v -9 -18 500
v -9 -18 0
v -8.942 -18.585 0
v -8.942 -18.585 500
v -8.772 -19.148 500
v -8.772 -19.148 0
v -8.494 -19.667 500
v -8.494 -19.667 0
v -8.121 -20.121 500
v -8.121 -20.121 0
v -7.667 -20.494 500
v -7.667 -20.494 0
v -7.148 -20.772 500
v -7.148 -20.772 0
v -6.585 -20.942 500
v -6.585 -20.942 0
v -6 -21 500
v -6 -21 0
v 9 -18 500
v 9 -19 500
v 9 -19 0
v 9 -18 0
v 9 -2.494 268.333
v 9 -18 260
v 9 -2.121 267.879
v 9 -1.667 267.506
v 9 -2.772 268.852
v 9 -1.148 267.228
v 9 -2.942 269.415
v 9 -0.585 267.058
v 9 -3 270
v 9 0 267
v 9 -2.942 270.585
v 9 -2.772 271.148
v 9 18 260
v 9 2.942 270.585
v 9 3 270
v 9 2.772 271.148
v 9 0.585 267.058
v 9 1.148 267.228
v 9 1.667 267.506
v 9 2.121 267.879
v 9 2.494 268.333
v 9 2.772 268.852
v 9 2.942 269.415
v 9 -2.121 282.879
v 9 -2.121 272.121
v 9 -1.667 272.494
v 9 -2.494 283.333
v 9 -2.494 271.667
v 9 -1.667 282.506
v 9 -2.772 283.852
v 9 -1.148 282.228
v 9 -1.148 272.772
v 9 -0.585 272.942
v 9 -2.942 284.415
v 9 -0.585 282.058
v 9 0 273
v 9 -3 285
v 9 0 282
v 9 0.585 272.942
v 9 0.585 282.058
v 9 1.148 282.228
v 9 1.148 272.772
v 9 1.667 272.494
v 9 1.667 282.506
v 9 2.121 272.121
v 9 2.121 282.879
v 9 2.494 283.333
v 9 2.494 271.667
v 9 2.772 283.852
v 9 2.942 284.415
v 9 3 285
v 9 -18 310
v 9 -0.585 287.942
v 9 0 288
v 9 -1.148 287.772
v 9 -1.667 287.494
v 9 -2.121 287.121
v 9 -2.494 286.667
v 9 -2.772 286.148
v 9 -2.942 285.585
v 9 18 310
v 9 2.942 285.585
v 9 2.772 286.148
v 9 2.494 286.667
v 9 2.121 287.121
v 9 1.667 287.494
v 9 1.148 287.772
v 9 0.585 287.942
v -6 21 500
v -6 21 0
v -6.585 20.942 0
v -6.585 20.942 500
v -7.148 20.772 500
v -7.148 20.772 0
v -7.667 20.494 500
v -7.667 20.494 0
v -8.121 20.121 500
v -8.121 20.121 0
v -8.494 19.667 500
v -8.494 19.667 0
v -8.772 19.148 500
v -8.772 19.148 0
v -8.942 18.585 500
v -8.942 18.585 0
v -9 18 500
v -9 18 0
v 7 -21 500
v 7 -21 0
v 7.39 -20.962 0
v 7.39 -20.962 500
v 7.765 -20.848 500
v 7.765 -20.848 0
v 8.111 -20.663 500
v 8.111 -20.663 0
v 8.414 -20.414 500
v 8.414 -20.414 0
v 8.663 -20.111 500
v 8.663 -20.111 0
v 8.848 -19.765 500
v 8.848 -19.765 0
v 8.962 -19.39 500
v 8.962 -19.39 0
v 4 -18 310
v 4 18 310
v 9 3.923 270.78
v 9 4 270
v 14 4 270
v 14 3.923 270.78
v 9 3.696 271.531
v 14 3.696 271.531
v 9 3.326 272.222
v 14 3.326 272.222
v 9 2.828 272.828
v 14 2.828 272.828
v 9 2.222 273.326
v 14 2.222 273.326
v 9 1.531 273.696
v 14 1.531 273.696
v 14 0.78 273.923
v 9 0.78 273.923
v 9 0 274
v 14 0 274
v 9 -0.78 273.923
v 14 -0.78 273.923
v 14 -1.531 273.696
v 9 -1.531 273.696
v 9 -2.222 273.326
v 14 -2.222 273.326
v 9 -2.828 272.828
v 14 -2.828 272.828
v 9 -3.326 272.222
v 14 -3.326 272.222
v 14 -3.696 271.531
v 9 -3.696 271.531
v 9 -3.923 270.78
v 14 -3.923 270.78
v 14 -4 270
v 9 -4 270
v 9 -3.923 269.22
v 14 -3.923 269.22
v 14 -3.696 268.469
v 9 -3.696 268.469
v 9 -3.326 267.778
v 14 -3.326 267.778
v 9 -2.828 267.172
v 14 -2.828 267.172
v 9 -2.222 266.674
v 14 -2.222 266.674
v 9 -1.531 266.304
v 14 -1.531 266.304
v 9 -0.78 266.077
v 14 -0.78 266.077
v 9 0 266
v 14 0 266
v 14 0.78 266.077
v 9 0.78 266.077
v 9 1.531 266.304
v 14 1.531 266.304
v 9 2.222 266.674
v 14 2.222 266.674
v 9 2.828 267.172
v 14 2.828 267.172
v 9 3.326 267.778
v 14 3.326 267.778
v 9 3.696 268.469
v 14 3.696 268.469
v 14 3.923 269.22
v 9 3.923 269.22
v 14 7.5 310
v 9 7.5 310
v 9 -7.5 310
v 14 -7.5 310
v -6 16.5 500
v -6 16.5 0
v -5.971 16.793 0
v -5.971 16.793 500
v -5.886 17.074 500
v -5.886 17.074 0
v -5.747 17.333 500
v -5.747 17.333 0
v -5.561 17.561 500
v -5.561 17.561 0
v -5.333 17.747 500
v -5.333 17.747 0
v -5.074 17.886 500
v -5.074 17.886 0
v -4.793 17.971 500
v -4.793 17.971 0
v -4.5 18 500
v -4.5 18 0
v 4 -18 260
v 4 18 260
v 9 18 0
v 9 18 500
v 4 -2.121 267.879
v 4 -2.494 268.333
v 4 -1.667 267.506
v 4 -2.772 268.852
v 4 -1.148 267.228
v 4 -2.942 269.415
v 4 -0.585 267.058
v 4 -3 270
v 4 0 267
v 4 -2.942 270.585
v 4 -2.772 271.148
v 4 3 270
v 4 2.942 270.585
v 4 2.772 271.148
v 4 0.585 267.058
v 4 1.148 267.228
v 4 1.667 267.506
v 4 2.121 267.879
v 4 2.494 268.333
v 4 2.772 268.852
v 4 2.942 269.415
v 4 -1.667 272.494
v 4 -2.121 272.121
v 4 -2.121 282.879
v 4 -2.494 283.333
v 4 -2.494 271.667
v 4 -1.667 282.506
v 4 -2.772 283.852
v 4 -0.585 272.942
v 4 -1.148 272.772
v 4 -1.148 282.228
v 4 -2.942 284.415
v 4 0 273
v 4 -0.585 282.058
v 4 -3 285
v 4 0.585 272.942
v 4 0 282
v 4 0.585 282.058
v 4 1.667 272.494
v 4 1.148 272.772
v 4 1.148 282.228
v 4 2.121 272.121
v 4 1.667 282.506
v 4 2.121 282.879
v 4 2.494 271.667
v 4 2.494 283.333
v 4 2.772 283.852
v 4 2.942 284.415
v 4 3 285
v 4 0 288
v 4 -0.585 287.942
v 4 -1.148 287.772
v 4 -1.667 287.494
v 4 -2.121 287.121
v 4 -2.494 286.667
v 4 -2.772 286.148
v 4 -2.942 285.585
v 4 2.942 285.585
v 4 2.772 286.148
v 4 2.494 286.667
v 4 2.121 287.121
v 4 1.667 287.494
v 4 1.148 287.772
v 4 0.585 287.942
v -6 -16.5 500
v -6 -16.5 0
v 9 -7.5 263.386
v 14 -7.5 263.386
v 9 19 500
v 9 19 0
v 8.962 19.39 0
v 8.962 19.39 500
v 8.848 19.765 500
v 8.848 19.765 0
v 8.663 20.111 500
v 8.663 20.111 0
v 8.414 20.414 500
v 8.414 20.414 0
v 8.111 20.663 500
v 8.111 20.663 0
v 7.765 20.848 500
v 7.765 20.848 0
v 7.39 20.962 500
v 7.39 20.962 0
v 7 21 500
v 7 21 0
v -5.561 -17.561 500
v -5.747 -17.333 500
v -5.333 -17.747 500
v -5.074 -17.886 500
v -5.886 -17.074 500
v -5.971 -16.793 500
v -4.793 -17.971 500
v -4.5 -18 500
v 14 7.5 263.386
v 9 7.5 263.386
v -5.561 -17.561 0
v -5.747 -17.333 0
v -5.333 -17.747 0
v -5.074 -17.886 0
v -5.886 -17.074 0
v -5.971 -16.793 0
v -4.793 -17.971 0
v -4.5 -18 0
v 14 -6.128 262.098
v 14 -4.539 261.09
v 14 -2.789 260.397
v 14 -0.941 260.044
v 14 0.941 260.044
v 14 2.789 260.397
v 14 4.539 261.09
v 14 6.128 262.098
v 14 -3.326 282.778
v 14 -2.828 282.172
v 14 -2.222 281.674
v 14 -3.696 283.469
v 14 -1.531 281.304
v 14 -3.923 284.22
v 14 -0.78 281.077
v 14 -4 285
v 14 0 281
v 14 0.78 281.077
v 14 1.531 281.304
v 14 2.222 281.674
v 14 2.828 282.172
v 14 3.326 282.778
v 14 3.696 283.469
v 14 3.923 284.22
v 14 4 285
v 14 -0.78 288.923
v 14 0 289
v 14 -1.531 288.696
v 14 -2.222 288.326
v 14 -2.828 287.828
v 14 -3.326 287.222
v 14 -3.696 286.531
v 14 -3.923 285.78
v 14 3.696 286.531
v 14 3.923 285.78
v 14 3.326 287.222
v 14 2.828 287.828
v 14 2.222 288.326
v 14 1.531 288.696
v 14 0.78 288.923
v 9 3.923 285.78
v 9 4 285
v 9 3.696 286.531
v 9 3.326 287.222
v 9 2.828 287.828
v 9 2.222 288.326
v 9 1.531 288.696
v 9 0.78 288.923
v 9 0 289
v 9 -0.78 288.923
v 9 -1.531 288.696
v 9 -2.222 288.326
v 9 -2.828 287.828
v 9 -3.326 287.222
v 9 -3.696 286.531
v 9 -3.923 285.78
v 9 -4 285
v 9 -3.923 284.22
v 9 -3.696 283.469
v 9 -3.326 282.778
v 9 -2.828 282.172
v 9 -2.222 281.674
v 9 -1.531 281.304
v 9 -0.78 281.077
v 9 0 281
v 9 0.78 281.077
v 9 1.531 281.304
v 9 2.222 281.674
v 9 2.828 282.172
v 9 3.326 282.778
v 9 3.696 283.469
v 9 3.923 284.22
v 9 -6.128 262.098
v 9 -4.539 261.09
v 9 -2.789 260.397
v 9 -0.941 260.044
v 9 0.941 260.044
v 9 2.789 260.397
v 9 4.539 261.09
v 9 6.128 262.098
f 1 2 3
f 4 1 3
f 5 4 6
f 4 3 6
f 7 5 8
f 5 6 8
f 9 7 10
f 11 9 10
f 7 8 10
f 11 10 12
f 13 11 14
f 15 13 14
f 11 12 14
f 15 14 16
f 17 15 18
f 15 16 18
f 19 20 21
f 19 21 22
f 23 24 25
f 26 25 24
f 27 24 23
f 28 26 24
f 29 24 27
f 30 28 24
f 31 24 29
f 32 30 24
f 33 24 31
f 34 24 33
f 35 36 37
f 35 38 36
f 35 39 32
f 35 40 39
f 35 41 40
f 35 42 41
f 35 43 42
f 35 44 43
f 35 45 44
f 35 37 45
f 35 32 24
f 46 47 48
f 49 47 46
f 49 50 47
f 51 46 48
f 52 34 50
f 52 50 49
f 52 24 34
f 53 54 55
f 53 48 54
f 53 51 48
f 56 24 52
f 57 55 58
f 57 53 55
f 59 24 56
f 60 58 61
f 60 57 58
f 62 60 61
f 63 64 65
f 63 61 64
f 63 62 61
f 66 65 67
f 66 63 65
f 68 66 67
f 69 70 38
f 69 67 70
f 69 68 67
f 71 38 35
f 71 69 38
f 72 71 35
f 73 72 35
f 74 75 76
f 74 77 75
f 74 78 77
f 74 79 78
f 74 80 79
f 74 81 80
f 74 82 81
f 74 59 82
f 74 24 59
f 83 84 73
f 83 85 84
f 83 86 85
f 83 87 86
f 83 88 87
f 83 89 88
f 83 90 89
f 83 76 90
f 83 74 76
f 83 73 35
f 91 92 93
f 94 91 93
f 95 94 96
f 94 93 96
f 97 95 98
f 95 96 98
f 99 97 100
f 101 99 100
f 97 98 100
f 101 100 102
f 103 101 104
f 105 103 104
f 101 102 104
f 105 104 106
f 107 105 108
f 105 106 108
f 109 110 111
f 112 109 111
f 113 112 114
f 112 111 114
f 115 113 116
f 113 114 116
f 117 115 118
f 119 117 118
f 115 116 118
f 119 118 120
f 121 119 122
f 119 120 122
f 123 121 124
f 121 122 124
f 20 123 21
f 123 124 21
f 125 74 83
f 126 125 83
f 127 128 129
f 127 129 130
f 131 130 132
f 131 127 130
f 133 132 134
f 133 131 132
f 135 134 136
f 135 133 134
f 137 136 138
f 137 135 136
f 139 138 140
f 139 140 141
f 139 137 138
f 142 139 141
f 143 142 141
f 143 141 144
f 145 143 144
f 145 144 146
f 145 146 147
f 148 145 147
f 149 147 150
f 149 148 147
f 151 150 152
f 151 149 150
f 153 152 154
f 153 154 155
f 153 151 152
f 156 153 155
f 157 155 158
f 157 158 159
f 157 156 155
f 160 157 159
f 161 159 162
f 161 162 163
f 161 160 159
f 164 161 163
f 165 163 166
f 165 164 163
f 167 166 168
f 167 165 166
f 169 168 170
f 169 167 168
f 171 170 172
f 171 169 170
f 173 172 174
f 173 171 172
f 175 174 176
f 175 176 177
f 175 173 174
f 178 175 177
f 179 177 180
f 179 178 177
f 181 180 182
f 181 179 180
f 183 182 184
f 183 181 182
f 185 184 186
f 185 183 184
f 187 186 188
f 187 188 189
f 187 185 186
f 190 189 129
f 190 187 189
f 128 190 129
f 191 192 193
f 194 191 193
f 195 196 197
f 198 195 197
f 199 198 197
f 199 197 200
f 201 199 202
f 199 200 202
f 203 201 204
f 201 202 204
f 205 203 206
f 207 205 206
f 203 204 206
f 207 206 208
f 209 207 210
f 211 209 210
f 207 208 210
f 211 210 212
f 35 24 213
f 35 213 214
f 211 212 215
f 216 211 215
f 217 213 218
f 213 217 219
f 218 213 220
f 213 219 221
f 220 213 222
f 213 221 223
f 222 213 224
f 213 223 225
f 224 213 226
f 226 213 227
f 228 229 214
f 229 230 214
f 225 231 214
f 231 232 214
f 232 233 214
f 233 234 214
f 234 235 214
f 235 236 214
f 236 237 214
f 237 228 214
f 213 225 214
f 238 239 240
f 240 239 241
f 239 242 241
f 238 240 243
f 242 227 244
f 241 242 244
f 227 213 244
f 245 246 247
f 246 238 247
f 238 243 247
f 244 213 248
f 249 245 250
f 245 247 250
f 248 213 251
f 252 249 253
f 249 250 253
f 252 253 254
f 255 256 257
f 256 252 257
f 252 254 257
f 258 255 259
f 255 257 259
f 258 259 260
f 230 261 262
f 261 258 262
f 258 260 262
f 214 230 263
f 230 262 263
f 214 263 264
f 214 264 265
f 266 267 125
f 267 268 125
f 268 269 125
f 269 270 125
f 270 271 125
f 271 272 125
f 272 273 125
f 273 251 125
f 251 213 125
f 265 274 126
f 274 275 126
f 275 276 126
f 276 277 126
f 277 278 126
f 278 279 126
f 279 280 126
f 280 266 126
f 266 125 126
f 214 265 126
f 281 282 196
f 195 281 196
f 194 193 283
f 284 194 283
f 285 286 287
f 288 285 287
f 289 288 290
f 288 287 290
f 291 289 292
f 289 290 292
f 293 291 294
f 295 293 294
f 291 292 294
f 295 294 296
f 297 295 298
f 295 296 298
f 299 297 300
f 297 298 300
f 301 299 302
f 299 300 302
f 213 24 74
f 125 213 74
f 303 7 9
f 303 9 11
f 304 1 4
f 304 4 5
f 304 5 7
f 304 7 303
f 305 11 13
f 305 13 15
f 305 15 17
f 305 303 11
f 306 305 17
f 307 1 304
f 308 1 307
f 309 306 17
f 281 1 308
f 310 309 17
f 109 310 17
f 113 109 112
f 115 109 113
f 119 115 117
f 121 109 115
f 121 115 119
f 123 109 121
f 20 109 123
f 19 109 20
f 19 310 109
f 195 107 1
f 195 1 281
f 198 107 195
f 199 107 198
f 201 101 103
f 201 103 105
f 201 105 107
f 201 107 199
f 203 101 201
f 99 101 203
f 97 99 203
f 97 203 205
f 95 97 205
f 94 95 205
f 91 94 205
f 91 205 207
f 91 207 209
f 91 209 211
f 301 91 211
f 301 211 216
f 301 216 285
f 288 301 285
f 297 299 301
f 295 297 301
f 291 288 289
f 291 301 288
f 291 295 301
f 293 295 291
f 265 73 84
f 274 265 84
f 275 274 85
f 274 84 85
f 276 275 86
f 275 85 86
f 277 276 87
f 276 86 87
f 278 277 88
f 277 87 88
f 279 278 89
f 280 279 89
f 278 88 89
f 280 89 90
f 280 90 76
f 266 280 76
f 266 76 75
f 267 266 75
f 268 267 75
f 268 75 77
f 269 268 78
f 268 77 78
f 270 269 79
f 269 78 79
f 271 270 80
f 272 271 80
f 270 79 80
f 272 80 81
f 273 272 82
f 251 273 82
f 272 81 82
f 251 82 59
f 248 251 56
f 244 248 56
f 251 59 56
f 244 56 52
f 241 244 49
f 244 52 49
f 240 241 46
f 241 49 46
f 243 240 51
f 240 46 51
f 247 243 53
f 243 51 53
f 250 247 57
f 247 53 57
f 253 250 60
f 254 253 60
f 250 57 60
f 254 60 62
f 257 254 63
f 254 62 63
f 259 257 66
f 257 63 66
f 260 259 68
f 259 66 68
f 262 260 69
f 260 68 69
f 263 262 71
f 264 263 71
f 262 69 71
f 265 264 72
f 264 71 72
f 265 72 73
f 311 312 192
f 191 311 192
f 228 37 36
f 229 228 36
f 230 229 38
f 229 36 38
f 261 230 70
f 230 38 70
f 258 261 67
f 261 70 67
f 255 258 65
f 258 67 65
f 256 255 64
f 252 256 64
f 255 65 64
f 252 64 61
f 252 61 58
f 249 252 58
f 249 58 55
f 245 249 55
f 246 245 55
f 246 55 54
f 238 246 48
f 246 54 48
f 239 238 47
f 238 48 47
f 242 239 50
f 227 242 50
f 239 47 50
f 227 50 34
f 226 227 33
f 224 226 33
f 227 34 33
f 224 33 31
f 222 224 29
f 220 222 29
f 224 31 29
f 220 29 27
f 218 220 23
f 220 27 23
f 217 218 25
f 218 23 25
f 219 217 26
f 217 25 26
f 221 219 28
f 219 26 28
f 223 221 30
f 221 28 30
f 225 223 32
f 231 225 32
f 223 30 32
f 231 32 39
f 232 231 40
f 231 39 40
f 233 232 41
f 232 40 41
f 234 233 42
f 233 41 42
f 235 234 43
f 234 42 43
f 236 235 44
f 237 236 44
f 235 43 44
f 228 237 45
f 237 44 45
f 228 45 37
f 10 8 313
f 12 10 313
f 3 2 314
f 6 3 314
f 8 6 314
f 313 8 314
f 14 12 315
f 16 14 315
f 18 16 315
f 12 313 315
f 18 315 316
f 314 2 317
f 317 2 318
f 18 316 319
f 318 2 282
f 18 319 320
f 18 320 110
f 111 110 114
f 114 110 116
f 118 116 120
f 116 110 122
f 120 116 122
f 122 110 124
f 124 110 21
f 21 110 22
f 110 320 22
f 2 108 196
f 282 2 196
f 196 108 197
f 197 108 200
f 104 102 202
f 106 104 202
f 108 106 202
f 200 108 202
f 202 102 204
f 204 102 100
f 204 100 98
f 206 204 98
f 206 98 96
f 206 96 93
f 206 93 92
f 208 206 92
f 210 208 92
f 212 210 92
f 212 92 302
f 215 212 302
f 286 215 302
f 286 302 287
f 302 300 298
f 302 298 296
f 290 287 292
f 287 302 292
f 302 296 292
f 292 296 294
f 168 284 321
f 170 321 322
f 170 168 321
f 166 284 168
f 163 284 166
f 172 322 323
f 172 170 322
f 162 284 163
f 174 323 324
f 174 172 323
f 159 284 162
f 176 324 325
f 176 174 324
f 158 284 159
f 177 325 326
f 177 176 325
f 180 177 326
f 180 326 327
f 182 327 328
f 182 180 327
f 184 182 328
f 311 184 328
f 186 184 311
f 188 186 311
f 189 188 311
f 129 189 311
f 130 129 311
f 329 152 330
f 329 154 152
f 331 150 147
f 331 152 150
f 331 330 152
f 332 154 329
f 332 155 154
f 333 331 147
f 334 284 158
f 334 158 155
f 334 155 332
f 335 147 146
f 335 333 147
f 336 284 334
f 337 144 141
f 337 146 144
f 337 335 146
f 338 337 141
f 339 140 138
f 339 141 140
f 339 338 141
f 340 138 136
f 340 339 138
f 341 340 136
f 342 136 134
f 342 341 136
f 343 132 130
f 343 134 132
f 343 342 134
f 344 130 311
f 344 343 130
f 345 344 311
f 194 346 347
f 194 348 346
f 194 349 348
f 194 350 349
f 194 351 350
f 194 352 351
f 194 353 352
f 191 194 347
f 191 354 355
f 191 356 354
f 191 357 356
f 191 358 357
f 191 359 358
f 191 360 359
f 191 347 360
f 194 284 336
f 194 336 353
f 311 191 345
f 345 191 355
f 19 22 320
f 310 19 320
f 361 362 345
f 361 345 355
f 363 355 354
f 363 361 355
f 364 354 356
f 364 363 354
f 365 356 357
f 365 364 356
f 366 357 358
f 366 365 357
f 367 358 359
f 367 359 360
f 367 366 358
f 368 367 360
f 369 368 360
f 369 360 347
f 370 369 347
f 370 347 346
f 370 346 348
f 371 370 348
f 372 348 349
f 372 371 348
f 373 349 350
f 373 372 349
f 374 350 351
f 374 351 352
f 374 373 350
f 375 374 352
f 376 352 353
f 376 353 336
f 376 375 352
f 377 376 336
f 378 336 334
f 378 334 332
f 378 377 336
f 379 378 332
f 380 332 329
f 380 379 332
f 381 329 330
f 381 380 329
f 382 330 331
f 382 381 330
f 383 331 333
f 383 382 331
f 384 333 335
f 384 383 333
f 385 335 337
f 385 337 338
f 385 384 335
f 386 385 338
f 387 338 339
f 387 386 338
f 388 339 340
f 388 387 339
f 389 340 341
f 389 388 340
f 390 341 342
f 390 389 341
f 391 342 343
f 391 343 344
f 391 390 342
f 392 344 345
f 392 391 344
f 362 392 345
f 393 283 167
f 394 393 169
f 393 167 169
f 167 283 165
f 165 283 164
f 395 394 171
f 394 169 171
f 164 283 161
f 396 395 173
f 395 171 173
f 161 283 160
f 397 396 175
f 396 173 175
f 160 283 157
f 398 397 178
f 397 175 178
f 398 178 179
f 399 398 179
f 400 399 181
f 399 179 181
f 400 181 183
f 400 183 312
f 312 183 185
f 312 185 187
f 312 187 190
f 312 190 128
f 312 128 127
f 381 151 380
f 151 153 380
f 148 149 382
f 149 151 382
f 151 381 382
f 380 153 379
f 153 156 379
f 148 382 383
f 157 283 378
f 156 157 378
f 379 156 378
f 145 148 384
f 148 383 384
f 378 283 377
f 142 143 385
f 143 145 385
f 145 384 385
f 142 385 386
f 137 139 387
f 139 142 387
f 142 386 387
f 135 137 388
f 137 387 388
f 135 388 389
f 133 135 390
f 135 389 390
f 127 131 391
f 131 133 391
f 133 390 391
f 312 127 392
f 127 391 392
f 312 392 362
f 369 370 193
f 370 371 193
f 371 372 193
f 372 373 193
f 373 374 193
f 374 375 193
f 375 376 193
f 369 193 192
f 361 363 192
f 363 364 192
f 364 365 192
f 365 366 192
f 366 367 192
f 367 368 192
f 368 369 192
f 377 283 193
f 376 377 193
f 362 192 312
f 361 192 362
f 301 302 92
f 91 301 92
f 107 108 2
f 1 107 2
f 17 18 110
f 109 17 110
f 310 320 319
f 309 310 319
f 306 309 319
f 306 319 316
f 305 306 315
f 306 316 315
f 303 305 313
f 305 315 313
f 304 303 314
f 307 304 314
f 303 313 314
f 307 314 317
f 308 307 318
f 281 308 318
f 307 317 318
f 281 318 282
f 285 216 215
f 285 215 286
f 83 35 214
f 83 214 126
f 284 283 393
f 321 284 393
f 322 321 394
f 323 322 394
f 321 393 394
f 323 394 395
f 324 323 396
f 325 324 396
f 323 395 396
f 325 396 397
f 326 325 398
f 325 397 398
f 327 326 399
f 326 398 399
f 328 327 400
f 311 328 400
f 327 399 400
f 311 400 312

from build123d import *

# Parameters (mm, degrees)
F1_DEPTH = 500
F2_W     = 36
F2_H     = 50
F2_R     = 3
F3_DEPTH = 5
F4_R     = 4
F5_DEPTH = 5


with BuildPart() as f1:
    # F0 (on Top) → F1 (new body)
    with BuildSketch(Plane.XY):
        with BuildLine():
            ThreePointArc((9, 19), (8.414214, 20.414214), (7, 21))
            Line((7, 21), (-6, 21))
            ThreePointArc((-6, 21), (-8.12132, 20.12132), (-9, 18))
            Line((-9, 18), (-9, -18))
            ThreePointArc((-9, -18), (-8.12132, -20.12132), (-6, -21))
            Line((-6, -21), (7, -21))
            ThreePointArc((7, -21), (8.414214, -20.414214), (9, -19))
            Line((9, -19), (9, -18))
            Line((9, -18), (-4.5, -18))
            ThreePointArc((-4.5, -18), (-5.56066, -17.56066), (-6, -16.5))
            Line((-6, -16.5), (-6, 16.5))
            ThreePointArc((-6, 16.5), (-5.56066, 17.56066), (-4.5, 18))
            Line((-4.5, 18), (9, 18))
            Line((9, 18), (9, 19))
        make_face()
    extrude(amount=F1_DEPTH)


with BuildPart() as f3:
    # F2 (on face) → F3 (new body)
    with BuildSketch(Plane.YZ.offset(9)):
        with Locations((0, 285)):
            Rectangle(F2_W, F2_H)
        with Locations((0, 270)):
            Circle(F2_R, mode=Mode.SUBTRACT)
        with Locations((0, 285)):
            Circle(F2_R, mode=Mode.SUBTRACT)
    extrude(amount=-F3_DEPTH)


with BuildPart() as f5:
    # F4 (on face) → F5 (new body)
    with BuildSketch(Plane.YZ.offset(9)):
        with BuildLine():
            Line((7.5, 310), (-7.5, 310))
            Line((-7.5, 310), (-7.5, 263.385622))
            ThreePointArc((-7.5, 263.385622), (0, 260), (7.5, 263.385622))
            Line((7.5, 263.385622), (7.5, 310))
        make_face()
        with Locations((0, 270)):
            Circle(F4_R, mode=Mode.SUBTRACT)
        with Locations((0, 285)):
            Circle(F4_R, mode=Mode.SUBTRACT)
    extrude(amount=F5_DEPTH)


solid = Compound([f1.part, f3.part, f5.part])
